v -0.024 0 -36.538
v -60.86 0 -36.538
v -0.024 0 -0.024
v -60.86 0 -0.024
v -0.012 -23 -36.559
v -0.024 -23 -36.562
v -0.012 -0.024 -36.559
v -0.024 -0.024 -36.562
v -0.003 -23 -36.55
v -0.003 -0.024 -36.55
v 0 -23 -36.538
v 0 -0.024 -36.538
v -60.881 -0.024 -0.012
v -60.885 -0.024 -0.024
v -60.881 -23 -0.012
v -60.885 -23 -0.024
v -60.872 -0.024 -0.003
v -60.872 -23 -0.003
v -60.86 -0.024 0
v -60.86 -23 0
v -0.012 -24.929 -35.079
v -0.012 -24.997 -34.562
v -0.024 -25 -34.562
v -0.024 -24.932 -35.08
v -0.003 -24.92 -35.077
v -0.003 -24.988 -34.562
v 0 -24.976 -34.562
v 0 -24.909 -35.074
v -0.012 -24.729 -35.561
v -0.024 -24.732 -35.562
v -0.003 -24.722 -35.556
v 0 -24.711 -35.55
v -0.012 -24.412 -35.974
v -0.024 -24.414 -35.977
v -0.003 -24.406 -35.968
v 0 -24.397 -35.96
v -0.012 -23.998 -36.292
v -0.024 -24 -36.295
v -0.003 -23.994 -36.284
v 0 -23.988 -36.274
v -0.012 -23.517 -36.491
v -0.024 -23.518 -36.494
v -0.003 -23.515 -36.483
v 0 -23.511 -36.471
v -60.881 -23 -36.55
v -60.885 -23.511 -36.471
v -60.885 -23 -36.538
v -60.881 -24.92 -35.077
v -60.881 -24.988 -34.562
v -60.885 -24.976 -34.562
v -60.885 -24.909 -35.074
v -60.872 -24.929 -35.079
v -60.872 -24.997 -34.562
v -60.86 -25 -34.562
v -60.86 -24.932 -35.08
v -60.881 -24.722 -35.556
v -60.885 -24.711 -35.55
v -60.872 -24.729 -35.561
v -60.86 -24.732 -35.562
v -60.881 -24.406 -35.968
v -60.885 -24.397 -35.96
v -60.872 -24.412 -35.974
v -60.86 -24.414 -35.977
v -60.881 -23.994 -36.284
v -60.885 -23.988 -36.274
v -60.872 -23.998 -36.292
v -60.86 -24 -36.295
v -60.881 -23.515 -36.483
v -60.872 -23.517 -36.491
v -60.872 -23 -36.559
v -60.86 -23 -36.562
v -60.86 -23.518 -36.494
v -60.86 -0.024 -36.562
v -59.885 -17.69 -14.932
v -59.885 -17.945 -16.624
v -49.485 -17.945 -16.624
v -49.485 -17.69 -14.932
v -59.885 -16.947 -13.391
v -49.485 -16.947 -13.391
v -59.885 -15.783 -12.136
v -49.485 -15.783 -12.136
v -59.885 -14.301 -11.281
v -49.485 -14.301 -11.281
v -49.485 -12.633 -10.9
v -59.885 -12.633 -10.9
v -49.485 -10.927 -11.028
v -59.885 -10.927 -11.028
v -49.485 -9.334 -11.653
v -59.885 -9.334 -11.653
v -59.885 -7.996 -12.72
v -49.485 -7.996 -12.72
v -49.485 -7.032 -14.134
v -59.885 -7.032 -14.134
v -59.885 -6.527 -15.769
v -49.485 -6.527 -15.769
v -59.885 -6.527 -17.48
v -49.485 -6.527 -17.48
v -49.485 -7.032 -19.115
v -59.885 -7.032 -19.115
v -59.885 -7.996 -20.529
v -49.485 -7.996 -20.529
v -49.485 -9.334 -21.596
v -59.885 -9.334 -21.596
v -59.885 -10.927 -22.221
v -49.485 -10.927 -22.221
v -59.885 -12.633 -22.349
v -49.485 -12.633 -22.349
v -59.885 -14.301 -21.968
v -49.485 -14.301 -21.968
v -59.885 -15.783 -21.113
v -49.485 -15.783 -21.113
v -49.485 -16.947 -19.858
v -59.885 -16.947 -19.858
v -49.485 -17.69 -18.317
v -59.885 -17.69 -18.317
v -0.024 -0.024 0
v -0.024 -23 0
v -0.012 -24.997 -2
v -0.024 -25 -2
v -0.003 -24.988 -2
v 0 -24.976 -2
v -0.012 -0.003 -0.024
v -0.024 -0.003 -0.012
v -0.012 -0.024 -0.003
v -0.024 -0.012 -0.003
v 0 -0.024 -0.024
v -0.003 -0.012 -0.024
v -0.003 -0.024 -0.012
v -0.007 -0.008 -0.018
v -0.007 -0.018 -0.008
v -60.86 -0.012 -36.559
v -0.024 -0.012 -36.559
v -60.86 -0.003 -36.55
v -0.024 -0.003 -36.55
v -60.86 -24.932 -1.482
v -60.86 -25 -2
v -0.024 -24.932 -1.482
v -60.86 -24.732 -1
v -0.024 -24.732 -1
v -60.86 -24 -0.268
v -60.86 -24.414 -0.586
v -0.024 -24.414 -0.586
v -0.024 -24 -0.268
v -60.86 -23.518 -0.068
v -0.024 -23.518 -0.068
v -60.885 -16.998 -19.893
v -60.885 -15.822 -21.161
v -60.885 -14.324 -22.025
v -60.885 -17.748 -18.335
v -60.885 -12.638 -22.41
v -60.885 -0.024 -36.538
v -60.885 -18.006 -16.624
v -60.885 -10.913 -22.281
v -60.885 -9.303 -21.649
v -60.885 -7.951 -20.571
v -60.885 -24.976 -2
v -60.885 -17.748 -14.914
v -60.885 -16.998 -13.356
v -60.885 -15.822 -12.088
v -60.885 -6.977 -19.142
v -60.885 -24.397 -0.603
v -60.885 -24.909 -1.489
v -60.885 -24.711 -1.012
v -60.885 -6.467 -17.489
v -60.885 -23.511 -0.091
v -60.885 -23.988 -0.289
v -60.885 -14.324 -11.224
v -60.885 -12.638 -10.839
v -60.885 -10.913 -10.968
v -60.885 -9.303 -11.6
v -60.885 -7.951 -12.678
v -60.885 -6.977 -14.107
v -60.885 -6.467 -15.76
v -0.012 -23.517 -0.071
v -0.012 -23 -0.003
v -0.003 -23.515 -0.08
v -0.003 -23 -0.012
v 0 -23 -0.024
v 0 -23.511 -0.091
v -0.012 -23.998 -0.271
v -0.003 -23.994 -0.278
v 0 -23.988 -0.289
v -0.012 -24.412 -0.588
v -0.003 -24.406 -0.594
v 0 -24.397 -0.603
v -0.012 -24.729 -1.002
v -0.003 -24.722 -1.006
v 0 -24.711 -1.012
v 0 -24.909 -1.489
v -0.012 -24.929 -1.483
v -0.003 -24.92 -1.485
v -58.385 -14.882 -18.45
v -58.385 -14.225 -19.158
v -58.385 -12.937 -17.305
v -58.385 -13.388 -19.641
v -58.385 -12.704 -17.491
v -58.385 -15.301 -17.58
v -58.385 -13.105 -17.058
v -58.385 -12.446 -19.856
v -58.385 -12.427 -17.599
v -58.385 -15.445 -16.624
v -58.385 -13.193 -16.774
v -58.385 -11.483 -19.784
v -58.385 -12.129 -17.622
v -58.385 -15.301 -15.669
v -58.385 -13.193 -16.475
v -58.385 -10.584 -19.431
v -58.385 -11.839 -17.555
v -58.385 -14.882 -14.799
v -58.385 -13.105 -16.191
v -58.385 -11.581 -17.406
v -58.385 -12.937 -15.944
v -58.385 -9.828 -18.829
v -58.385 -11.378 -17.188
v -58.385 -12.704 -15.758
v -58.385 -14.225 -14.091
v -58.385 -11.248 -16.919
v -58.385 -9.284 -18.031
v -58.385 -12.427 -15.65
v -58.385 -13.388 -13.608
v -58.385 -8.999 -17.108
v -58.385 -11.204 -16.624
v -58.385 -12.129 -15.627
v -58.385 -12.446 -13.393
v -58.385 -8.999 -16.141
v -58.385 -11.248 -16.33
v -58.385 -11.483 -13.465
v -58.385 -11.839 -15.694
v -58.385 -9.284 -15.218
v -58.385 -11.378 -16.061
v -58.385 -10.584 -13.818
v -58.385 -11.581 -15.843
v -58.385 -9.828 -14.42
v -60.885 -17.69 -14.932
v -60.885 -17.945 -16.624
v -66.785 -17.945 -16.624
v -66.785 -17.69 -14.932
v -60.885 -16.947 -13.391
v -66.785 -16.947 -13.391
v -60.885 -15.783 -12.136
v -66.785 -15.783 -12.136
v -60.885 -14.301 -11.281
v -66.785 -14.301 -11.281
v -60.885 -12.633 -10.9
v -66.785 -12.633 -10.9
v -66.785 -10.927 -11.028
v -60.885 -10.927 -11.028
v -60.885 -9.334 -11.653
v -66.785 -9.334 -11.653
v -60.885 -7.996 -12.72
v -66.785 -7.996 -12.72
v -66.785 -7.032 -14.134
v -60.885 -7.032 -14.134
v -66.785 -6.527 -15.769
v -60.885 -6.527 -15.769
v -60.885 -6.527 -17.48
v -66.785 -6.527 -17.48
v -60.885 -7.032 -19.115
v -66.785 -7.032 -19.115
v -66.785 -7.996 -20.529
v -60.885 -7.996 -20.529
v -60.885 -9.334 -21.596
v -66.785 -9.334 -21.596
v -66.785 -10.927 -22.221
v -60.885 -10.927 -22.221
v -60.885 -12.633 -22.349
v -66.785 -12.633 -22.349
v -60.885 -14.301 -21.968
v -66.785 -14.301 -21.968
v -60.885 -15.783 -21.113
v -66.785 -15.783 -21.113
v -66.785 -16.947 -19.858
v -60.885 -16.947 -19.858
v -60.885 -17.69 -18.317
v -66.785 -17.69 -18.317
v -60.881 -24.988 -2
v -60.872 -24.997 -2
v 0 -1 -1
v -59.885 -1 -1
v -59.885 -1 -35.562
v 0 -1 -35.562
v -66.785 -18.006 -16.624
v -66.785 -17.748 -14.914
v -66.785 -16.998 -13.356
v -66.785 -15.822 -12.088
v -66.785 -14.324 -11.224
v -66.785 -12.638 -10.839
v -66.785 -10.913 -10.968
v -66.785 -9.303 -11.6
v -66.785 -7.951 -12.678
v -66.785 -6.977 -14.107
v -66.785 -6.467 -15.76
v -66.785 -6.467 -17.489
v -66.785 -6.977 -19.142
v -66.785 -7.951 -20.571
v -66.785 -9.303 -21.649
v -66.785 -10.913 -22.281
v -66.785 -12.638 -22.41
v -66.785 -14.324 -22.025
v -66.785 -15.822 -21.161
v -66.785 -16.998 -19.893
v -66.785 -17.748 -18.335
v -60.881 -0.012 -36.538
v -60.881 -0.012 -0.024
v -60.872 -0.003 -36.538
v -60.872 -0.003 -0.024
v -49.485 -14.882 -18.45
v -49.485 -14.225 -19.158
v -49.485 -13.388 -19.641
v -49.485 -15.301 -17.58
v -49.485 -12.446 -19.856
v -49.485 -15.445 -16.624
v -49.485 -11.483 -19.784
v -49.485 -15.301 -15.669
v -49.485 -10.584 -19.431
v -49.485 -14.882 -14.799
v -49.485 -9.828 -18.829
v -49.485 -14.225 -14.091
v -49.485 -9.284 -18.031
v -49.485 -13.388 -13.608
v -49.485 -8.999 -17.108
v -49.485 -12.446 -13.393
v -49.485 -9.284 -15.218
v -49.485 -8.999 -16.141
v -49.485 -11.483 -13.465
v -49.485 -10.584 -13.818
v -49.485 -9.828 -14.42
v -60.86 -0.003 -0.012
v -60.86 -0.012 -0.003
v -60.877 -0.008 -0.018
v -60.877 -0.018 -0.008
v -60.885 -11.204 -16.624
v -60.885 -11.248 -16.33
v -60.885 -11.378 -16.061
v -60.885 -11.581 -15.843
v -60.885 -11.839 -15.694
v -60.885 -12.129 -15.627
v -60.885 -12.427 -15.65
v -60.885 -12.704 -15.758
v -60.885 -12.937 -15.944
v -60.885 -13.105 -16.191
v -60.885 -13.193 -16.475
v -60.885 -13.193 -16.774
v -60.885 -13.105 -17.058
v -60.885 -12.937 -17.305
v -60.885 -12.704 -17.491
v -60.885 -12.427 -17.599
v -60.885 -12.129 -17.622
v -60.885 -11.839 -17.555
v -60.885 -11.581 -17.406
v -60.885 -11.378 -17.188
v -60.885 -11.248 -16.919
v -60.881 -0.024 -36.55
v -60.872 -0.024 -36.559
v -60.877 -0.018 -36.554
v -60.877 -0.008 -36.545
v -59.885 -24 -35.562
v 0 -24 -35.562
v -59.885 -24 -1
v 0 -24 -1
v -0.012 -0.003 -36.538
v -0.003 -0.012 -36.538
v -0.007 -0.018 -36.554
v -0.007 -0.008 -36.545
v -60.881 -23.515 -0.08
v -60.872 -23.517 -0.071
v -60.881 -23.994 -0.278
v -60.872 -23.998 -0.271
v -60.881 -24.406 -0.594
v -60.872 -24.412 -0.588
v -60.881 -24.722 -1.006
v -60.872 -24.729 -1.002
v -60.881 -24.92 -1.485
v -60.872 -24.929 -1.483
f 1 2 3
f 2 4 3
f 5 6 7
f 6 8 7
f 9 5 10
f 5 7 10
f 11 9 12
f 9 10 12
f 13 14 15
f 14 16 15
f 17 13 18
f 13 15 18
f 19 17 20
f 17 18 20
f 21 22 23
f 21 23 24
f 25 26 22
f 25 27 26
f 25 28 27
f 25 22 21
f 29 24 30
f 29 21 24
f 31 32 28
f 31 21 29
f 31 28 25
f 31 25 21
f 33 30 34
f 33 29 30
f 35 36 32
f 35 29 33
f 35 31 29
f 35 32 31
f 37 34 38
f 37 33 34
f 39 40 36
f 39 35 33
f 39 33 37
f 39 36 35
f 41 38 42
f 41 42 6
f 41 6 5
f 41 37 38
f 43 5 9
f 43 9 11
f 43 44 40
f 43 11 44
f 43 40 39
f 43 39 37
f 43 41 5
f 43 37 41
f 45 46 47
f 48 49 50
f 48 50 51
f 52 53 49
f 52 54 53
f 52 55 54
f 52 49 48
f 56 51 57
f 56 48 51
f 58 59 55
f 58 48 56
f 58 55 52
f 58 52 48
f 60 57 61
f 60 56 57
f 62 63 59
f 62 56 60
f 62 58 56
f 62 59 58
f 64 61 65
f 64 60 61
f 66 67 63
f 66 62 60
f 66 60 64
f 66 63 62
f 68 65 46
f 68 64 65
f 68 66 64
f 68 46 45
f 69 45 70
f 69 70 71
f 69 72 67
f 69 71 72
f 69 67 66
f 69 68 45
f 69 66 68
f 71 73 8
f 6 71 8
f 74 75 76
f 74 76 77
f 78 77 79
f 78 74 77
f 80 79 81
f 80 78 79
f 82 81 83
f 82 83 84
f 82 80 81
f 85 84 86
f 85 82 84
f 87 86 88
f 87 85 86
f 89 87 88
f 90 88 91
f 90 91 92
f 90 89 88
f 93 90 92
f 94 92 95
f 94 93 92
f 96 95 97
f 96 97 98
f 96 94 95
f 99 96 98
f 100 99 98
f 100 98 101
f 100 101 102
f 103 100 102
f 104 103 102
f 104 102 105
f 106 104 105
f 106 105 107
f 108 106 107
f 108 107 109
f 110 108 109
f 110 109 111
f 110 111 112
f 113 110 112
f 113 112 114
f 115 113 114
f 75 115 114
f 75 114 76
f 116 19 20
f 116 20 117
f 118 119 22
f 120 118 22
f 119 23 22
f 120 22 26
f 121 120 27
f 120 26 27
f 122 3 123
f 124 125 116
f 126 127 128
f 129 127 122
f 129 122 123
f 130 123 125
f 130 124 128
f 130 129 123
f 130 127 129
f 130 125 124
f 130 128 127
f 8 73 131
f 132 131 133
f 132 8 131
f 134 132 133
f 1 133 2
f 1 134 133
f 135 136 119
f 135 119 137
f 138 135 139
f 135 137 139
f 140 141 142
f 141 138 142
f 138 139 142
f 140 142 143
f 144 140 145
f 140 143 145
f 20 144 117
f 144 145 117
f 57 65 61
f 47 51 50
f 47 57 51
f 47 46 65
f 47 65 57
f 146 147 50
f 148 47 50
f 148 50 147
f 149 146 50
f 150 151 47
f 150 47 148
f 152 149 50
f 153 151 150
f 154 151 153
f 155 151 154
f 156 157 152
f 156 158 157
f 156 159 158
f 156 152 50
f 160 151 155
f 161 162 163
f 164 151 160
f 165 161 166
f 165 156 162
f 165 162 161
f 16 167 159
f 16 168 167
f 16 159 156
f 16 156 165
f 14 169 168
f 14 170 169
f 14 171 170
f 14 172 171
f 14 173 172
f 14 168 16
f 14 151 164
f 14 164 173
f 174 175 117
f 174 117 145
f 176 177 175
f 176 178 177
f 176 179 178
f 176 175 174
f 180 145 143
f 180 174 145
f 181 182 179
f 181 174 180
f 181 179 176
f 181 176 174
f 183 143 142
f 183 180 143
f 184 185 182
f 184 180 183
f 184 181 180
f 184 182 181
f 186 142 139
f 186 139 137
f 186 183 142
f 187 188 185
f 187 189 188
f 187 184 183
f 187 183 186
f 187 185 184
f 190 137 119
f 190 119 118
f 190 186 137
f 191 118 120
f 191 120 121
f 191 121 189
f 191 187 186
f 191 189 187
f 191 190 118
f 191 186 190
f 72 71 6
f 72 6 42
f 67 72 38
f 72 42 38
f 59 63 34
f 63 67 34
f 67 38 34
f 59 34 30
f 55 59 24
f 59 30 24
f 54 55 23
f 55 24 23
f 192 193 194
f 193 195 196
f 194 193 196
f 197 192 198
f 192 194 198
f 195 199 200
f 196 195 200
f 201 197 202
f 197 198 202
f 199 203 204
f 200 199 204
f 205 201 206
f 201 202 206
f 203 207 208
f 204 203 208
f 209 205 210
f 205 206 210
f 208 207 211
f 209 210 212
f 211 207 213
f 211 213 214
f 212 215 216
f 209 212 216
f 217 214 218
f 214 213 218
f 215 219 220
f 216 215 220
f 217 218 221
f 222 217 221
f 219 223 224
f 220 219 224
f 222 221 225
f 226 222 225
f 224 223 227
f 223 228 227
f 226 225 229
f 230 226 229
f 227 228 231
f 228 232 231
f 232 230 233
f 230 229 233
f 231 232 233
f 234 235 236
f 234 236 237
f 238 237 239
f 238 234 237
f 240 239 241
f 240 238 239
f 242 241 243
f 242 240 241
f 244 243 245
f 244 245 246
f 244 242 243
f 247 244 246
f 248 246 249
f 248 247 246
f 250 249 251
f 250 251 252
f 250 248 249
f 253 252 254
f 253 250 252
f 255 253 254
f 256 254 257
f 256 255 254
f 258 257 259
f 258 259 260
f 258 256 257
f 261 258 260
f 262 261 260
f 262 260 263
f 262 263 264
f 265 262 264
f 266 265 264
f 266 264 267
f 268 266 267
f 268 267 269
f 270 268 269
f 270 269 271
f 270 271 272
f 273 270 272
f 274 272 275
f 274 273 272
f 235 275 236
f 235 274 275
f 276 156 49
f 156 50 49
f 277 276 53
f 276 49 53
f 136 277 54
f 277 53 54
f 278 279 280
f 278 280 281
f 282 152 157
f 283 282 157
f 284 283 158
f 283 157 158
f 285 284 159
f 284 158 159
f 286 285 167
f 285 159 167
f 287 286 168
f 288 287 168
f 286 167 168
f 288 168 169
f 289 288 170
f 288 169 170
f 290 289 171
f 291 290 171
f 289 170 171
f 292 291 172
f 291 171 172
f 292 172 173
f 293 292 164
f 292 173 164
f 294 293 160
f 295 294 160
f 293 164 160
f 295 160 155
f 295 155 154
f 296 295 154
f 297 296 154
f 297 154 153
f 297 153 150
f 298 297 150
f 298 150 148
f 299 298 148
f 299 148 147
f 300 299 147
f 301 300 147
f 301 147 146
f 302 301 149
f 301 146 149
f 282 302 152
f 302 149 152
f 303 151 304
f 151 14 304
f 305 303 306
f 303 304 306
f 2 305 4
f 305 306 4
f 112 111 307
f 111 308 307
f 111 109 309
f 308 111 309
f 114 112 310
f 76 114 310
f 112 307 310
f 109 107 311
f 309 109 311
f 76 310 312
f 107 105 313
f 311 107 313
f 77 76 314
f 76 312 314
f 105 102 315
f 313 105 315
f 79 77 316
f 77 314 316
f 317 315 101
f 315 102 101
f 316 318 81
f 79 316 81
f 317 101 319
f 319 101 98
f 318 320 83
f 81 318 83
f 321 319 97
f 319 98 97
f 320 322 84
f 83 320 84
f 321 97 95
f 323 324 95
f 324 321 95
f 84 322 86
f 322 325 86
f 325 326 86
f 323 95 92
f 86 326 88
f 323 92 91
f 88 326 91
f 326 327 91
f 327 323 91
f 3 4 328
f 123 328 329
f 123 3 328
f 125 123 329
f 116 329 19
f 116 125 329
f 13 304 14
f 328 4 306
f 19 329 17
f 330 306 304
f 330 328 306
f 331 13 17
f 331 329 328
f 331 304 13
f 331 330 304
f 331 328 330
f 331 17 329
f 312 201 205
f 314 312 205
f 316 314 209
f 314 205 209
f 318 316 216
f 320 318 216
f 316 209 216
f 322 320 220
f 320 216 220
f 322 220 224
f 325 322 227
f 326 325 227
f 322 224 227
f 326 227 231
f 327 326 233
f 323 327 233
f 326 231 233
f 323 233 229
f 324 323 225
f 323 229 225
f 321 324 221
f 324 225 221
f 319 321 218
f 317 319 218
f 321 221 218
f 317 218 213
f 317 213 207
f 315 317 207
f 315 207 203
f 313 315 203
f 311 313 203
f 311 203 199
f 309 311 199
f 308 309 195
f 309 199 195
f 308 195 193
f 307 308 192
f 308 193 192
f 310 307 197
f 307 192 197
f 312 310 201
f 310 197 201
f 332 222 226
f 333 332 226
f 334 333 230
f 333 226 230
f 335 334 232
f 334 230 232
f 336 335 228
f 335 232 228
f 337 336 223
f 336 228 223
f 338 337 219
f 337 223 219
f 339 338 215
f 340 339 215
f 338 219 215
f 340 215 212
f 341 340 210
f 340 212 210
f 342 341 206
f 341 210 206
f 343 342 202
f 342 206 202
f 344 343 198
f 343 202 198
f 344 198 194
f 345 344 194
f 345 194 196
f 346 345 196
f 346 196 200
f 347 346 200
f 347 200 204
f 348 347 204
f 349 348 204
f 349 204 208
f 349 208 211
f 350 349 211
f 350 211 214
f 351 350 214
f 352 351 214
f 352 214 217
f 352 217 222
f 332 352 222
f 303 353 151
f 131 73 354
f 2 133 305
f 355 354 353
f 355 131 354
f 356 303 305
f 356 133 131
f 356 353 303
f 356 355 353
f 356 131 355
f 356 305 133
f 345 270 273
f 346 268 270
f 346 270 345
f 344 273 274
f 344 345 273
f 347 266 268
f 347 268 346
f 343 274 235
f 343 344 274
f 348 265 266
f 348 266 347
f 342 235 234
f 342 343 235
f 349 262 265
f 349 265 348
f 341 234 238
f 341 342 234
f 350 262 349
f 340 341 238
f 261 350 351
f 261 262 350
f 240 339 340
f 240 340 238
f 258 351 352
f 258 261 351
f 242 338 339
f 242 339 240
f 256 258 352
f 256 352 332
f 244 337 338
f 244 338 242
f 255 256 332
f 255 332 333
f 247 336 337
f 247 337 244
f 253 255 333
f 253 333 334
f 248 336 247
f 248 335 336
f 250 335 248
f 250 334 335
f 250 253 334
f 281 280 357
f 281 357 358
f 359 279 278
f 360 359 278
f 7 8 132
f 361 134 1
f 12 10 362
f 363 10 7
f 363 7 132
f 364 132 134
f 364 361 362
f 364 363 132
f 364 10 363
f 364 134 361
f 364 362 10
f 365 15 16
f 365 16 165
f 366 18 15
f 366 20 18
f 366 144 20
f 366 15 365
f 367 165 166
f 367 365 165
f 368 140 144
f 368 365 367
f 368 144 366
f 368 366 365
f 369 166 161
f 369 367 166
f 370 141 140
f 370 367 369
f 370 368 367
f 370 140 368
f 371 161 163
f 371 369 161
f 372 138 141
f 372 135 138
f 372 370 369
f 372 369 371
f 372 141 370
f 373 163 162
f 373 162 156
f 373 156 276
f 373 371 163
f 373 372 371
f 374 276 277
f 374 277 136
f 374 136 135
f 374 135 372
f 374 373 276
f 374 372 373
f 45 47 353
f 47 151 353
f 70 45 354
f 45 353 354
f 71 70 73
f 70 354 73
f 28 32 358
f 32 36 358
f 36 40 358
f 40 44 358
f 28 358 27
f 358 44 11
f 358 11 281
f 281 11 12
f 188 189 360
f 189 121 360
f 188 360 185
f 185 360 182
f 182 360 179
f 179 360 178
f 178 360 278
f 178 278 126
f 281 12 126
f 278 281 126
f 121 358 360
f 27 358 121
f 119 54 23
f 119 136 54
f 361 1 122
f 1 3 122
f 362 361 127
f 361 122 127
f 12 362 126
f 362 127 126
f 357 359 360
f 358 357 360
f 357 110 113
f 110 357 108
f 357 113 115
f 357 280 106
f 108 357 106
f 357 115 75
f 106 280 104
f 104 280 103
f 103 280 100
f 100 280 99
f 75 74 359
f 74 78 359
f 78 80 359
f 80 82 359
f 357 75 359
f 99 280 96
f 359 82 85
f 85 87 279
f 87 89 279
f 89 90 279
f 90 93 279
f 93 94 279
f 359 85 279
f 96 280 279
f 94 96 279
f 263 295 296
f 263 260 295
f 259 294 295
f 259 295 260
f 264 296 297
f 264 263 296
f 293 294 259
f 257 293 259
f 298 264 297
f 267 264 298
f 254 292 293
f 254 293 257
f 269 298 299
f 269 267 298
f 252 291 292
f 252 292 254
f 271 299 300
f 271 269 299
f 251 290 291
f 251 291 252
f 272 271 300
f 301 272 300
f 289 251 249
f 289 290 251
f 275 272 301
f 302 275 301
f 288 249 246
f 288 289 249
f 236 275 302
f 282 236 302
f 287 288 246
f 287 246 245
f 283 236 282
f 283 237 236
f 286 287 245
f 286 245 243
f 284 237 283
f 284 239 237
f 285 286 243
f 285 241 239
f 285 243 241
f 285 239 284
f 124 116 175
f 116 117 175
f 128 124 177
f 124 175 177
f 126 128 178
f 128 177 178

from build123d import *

# Parameters (mm, degrees)
F0_W     = 60.8845241368
F0_H     = 36.5624986589
F1_DEPTH = 25
F2_T     = -1
F3_R     = 5.8019318328
F3_R_2   = 5.7407936272
F4_DEPTH = 5.9
F5_DEPTH = 11.4
F6_T     = -2.5
F9_D     = 2
F10_R    = 2
F11_R    = 0.0241421356
F12_R    = 0.0241421356


# Not quite as in the source:
# - a feature of the source that left no trace in its solid (it failed there, or was rolled back) is left out


with BuildPart() as f1:
    # F0 (on Front) → F1 (new body)
    with BuildSketch(Plane.XZ):
        with Locations((-30.4422620684, -18.2812493294)):
            Rectangle(F0_W, F0_H)
    extrude(amount=F1_DEPTH)

    # F2
    f2_openings = [f1.faces().sort_by_distance(p)[0] for p in [
        (0, -12.5, -18.281249),
    ]]
    offset(amount=F2_T, openings=f2_openings)

    # F3 (on face) → F4 (join)
    with BuildSketch(Plane(origin=(-60.8845241368, 0, 0), x_dir=(0, -1, 0), z_dir=(-1, 0, 0))):
        with Locations((12.2040687129, -16.6244860739)):
            Circle(F3_R)
        with Locations((12.2040687129, -16.6244860739)):
            Circle(F3_R_2, mode=Mode.SUBTRACT)
    extrude(amount=F4_DEPTH)

    # F5 (add): a face of the model
    f5_faces = [f1.faces().sort_by_distance(p)[0] for p in [
        (-60.8845241368, -12.2040687129, -16.6244860739),
    ]]
    extrude(f5_faces, amount=-F5_DEPTH)

    # F6
    f6_openings = [f1.faces().sort_by_distance(p)[0] for p in [
        (-49.484524, -12.204069, -16.624486),
    ]]
    offset(amount=F6_T, openings=f6_openings)

    # F9 (through all)
    with Locations(Plane(origin=(-60.8845241368, 0, 0), x_dir=(0, -1, 0), z_dir=(-1, 0, 0))):
        with Locations((12.2040687129, -16.6244860739)):
            Hole(F9_D / 2)

    # F10
    f10_edges = [f1.edges().sort_by_distance(p)[0] for p in [
        (-30.442262, -25, -36.562499),
        (-30.442262, -25, 0),
    ]]
    fillet(f10_edges, radius=F10_R)

    # F11
    f11_edges = [f1.edges().sort_by_distance(p)[0] for p in [
        (-30.442262, 0, -36.562499),
        (-30.442262, 0, 0),
    ]]
    fillet(f11_edges, radius=F11_R)

    # F12
    f12_edges = [f1.edges().sort_by_distance(p)[0] for p in [
        (-30.442262, -0.024142, -36.562499),
        (-30.442262, 0, -0.024142),
        (0, 0, -18.281249),
        (-60.884524, 0, -18.281249),
        (0, -11.512071, 0),
        (-60.884524, -11.512071, 0),
        (0, -11.512071, -36.562499),
        (0, -0.007071, -36.555428),
        (0, -24.414214, -35.976712),
        (0, -25, -18.281249),
        (0, -0.007071, -0.007071),
        (0, -24.414214, -0.585786),
        (-60.884524, -0.007071, -0.007071),
        (-60.884524, -24.414214, -0.585786),
        (-60.884524, -25, -18.281249),
        (-60.884524, -0.007071, -36.555428),
        (-60.884524, -24.414214, -35.976712),
        (-60.884524, -11.512071, -36.562499),
    ]]
    fillet(f12_edges, radius=F12_R)


solid = f1.part
